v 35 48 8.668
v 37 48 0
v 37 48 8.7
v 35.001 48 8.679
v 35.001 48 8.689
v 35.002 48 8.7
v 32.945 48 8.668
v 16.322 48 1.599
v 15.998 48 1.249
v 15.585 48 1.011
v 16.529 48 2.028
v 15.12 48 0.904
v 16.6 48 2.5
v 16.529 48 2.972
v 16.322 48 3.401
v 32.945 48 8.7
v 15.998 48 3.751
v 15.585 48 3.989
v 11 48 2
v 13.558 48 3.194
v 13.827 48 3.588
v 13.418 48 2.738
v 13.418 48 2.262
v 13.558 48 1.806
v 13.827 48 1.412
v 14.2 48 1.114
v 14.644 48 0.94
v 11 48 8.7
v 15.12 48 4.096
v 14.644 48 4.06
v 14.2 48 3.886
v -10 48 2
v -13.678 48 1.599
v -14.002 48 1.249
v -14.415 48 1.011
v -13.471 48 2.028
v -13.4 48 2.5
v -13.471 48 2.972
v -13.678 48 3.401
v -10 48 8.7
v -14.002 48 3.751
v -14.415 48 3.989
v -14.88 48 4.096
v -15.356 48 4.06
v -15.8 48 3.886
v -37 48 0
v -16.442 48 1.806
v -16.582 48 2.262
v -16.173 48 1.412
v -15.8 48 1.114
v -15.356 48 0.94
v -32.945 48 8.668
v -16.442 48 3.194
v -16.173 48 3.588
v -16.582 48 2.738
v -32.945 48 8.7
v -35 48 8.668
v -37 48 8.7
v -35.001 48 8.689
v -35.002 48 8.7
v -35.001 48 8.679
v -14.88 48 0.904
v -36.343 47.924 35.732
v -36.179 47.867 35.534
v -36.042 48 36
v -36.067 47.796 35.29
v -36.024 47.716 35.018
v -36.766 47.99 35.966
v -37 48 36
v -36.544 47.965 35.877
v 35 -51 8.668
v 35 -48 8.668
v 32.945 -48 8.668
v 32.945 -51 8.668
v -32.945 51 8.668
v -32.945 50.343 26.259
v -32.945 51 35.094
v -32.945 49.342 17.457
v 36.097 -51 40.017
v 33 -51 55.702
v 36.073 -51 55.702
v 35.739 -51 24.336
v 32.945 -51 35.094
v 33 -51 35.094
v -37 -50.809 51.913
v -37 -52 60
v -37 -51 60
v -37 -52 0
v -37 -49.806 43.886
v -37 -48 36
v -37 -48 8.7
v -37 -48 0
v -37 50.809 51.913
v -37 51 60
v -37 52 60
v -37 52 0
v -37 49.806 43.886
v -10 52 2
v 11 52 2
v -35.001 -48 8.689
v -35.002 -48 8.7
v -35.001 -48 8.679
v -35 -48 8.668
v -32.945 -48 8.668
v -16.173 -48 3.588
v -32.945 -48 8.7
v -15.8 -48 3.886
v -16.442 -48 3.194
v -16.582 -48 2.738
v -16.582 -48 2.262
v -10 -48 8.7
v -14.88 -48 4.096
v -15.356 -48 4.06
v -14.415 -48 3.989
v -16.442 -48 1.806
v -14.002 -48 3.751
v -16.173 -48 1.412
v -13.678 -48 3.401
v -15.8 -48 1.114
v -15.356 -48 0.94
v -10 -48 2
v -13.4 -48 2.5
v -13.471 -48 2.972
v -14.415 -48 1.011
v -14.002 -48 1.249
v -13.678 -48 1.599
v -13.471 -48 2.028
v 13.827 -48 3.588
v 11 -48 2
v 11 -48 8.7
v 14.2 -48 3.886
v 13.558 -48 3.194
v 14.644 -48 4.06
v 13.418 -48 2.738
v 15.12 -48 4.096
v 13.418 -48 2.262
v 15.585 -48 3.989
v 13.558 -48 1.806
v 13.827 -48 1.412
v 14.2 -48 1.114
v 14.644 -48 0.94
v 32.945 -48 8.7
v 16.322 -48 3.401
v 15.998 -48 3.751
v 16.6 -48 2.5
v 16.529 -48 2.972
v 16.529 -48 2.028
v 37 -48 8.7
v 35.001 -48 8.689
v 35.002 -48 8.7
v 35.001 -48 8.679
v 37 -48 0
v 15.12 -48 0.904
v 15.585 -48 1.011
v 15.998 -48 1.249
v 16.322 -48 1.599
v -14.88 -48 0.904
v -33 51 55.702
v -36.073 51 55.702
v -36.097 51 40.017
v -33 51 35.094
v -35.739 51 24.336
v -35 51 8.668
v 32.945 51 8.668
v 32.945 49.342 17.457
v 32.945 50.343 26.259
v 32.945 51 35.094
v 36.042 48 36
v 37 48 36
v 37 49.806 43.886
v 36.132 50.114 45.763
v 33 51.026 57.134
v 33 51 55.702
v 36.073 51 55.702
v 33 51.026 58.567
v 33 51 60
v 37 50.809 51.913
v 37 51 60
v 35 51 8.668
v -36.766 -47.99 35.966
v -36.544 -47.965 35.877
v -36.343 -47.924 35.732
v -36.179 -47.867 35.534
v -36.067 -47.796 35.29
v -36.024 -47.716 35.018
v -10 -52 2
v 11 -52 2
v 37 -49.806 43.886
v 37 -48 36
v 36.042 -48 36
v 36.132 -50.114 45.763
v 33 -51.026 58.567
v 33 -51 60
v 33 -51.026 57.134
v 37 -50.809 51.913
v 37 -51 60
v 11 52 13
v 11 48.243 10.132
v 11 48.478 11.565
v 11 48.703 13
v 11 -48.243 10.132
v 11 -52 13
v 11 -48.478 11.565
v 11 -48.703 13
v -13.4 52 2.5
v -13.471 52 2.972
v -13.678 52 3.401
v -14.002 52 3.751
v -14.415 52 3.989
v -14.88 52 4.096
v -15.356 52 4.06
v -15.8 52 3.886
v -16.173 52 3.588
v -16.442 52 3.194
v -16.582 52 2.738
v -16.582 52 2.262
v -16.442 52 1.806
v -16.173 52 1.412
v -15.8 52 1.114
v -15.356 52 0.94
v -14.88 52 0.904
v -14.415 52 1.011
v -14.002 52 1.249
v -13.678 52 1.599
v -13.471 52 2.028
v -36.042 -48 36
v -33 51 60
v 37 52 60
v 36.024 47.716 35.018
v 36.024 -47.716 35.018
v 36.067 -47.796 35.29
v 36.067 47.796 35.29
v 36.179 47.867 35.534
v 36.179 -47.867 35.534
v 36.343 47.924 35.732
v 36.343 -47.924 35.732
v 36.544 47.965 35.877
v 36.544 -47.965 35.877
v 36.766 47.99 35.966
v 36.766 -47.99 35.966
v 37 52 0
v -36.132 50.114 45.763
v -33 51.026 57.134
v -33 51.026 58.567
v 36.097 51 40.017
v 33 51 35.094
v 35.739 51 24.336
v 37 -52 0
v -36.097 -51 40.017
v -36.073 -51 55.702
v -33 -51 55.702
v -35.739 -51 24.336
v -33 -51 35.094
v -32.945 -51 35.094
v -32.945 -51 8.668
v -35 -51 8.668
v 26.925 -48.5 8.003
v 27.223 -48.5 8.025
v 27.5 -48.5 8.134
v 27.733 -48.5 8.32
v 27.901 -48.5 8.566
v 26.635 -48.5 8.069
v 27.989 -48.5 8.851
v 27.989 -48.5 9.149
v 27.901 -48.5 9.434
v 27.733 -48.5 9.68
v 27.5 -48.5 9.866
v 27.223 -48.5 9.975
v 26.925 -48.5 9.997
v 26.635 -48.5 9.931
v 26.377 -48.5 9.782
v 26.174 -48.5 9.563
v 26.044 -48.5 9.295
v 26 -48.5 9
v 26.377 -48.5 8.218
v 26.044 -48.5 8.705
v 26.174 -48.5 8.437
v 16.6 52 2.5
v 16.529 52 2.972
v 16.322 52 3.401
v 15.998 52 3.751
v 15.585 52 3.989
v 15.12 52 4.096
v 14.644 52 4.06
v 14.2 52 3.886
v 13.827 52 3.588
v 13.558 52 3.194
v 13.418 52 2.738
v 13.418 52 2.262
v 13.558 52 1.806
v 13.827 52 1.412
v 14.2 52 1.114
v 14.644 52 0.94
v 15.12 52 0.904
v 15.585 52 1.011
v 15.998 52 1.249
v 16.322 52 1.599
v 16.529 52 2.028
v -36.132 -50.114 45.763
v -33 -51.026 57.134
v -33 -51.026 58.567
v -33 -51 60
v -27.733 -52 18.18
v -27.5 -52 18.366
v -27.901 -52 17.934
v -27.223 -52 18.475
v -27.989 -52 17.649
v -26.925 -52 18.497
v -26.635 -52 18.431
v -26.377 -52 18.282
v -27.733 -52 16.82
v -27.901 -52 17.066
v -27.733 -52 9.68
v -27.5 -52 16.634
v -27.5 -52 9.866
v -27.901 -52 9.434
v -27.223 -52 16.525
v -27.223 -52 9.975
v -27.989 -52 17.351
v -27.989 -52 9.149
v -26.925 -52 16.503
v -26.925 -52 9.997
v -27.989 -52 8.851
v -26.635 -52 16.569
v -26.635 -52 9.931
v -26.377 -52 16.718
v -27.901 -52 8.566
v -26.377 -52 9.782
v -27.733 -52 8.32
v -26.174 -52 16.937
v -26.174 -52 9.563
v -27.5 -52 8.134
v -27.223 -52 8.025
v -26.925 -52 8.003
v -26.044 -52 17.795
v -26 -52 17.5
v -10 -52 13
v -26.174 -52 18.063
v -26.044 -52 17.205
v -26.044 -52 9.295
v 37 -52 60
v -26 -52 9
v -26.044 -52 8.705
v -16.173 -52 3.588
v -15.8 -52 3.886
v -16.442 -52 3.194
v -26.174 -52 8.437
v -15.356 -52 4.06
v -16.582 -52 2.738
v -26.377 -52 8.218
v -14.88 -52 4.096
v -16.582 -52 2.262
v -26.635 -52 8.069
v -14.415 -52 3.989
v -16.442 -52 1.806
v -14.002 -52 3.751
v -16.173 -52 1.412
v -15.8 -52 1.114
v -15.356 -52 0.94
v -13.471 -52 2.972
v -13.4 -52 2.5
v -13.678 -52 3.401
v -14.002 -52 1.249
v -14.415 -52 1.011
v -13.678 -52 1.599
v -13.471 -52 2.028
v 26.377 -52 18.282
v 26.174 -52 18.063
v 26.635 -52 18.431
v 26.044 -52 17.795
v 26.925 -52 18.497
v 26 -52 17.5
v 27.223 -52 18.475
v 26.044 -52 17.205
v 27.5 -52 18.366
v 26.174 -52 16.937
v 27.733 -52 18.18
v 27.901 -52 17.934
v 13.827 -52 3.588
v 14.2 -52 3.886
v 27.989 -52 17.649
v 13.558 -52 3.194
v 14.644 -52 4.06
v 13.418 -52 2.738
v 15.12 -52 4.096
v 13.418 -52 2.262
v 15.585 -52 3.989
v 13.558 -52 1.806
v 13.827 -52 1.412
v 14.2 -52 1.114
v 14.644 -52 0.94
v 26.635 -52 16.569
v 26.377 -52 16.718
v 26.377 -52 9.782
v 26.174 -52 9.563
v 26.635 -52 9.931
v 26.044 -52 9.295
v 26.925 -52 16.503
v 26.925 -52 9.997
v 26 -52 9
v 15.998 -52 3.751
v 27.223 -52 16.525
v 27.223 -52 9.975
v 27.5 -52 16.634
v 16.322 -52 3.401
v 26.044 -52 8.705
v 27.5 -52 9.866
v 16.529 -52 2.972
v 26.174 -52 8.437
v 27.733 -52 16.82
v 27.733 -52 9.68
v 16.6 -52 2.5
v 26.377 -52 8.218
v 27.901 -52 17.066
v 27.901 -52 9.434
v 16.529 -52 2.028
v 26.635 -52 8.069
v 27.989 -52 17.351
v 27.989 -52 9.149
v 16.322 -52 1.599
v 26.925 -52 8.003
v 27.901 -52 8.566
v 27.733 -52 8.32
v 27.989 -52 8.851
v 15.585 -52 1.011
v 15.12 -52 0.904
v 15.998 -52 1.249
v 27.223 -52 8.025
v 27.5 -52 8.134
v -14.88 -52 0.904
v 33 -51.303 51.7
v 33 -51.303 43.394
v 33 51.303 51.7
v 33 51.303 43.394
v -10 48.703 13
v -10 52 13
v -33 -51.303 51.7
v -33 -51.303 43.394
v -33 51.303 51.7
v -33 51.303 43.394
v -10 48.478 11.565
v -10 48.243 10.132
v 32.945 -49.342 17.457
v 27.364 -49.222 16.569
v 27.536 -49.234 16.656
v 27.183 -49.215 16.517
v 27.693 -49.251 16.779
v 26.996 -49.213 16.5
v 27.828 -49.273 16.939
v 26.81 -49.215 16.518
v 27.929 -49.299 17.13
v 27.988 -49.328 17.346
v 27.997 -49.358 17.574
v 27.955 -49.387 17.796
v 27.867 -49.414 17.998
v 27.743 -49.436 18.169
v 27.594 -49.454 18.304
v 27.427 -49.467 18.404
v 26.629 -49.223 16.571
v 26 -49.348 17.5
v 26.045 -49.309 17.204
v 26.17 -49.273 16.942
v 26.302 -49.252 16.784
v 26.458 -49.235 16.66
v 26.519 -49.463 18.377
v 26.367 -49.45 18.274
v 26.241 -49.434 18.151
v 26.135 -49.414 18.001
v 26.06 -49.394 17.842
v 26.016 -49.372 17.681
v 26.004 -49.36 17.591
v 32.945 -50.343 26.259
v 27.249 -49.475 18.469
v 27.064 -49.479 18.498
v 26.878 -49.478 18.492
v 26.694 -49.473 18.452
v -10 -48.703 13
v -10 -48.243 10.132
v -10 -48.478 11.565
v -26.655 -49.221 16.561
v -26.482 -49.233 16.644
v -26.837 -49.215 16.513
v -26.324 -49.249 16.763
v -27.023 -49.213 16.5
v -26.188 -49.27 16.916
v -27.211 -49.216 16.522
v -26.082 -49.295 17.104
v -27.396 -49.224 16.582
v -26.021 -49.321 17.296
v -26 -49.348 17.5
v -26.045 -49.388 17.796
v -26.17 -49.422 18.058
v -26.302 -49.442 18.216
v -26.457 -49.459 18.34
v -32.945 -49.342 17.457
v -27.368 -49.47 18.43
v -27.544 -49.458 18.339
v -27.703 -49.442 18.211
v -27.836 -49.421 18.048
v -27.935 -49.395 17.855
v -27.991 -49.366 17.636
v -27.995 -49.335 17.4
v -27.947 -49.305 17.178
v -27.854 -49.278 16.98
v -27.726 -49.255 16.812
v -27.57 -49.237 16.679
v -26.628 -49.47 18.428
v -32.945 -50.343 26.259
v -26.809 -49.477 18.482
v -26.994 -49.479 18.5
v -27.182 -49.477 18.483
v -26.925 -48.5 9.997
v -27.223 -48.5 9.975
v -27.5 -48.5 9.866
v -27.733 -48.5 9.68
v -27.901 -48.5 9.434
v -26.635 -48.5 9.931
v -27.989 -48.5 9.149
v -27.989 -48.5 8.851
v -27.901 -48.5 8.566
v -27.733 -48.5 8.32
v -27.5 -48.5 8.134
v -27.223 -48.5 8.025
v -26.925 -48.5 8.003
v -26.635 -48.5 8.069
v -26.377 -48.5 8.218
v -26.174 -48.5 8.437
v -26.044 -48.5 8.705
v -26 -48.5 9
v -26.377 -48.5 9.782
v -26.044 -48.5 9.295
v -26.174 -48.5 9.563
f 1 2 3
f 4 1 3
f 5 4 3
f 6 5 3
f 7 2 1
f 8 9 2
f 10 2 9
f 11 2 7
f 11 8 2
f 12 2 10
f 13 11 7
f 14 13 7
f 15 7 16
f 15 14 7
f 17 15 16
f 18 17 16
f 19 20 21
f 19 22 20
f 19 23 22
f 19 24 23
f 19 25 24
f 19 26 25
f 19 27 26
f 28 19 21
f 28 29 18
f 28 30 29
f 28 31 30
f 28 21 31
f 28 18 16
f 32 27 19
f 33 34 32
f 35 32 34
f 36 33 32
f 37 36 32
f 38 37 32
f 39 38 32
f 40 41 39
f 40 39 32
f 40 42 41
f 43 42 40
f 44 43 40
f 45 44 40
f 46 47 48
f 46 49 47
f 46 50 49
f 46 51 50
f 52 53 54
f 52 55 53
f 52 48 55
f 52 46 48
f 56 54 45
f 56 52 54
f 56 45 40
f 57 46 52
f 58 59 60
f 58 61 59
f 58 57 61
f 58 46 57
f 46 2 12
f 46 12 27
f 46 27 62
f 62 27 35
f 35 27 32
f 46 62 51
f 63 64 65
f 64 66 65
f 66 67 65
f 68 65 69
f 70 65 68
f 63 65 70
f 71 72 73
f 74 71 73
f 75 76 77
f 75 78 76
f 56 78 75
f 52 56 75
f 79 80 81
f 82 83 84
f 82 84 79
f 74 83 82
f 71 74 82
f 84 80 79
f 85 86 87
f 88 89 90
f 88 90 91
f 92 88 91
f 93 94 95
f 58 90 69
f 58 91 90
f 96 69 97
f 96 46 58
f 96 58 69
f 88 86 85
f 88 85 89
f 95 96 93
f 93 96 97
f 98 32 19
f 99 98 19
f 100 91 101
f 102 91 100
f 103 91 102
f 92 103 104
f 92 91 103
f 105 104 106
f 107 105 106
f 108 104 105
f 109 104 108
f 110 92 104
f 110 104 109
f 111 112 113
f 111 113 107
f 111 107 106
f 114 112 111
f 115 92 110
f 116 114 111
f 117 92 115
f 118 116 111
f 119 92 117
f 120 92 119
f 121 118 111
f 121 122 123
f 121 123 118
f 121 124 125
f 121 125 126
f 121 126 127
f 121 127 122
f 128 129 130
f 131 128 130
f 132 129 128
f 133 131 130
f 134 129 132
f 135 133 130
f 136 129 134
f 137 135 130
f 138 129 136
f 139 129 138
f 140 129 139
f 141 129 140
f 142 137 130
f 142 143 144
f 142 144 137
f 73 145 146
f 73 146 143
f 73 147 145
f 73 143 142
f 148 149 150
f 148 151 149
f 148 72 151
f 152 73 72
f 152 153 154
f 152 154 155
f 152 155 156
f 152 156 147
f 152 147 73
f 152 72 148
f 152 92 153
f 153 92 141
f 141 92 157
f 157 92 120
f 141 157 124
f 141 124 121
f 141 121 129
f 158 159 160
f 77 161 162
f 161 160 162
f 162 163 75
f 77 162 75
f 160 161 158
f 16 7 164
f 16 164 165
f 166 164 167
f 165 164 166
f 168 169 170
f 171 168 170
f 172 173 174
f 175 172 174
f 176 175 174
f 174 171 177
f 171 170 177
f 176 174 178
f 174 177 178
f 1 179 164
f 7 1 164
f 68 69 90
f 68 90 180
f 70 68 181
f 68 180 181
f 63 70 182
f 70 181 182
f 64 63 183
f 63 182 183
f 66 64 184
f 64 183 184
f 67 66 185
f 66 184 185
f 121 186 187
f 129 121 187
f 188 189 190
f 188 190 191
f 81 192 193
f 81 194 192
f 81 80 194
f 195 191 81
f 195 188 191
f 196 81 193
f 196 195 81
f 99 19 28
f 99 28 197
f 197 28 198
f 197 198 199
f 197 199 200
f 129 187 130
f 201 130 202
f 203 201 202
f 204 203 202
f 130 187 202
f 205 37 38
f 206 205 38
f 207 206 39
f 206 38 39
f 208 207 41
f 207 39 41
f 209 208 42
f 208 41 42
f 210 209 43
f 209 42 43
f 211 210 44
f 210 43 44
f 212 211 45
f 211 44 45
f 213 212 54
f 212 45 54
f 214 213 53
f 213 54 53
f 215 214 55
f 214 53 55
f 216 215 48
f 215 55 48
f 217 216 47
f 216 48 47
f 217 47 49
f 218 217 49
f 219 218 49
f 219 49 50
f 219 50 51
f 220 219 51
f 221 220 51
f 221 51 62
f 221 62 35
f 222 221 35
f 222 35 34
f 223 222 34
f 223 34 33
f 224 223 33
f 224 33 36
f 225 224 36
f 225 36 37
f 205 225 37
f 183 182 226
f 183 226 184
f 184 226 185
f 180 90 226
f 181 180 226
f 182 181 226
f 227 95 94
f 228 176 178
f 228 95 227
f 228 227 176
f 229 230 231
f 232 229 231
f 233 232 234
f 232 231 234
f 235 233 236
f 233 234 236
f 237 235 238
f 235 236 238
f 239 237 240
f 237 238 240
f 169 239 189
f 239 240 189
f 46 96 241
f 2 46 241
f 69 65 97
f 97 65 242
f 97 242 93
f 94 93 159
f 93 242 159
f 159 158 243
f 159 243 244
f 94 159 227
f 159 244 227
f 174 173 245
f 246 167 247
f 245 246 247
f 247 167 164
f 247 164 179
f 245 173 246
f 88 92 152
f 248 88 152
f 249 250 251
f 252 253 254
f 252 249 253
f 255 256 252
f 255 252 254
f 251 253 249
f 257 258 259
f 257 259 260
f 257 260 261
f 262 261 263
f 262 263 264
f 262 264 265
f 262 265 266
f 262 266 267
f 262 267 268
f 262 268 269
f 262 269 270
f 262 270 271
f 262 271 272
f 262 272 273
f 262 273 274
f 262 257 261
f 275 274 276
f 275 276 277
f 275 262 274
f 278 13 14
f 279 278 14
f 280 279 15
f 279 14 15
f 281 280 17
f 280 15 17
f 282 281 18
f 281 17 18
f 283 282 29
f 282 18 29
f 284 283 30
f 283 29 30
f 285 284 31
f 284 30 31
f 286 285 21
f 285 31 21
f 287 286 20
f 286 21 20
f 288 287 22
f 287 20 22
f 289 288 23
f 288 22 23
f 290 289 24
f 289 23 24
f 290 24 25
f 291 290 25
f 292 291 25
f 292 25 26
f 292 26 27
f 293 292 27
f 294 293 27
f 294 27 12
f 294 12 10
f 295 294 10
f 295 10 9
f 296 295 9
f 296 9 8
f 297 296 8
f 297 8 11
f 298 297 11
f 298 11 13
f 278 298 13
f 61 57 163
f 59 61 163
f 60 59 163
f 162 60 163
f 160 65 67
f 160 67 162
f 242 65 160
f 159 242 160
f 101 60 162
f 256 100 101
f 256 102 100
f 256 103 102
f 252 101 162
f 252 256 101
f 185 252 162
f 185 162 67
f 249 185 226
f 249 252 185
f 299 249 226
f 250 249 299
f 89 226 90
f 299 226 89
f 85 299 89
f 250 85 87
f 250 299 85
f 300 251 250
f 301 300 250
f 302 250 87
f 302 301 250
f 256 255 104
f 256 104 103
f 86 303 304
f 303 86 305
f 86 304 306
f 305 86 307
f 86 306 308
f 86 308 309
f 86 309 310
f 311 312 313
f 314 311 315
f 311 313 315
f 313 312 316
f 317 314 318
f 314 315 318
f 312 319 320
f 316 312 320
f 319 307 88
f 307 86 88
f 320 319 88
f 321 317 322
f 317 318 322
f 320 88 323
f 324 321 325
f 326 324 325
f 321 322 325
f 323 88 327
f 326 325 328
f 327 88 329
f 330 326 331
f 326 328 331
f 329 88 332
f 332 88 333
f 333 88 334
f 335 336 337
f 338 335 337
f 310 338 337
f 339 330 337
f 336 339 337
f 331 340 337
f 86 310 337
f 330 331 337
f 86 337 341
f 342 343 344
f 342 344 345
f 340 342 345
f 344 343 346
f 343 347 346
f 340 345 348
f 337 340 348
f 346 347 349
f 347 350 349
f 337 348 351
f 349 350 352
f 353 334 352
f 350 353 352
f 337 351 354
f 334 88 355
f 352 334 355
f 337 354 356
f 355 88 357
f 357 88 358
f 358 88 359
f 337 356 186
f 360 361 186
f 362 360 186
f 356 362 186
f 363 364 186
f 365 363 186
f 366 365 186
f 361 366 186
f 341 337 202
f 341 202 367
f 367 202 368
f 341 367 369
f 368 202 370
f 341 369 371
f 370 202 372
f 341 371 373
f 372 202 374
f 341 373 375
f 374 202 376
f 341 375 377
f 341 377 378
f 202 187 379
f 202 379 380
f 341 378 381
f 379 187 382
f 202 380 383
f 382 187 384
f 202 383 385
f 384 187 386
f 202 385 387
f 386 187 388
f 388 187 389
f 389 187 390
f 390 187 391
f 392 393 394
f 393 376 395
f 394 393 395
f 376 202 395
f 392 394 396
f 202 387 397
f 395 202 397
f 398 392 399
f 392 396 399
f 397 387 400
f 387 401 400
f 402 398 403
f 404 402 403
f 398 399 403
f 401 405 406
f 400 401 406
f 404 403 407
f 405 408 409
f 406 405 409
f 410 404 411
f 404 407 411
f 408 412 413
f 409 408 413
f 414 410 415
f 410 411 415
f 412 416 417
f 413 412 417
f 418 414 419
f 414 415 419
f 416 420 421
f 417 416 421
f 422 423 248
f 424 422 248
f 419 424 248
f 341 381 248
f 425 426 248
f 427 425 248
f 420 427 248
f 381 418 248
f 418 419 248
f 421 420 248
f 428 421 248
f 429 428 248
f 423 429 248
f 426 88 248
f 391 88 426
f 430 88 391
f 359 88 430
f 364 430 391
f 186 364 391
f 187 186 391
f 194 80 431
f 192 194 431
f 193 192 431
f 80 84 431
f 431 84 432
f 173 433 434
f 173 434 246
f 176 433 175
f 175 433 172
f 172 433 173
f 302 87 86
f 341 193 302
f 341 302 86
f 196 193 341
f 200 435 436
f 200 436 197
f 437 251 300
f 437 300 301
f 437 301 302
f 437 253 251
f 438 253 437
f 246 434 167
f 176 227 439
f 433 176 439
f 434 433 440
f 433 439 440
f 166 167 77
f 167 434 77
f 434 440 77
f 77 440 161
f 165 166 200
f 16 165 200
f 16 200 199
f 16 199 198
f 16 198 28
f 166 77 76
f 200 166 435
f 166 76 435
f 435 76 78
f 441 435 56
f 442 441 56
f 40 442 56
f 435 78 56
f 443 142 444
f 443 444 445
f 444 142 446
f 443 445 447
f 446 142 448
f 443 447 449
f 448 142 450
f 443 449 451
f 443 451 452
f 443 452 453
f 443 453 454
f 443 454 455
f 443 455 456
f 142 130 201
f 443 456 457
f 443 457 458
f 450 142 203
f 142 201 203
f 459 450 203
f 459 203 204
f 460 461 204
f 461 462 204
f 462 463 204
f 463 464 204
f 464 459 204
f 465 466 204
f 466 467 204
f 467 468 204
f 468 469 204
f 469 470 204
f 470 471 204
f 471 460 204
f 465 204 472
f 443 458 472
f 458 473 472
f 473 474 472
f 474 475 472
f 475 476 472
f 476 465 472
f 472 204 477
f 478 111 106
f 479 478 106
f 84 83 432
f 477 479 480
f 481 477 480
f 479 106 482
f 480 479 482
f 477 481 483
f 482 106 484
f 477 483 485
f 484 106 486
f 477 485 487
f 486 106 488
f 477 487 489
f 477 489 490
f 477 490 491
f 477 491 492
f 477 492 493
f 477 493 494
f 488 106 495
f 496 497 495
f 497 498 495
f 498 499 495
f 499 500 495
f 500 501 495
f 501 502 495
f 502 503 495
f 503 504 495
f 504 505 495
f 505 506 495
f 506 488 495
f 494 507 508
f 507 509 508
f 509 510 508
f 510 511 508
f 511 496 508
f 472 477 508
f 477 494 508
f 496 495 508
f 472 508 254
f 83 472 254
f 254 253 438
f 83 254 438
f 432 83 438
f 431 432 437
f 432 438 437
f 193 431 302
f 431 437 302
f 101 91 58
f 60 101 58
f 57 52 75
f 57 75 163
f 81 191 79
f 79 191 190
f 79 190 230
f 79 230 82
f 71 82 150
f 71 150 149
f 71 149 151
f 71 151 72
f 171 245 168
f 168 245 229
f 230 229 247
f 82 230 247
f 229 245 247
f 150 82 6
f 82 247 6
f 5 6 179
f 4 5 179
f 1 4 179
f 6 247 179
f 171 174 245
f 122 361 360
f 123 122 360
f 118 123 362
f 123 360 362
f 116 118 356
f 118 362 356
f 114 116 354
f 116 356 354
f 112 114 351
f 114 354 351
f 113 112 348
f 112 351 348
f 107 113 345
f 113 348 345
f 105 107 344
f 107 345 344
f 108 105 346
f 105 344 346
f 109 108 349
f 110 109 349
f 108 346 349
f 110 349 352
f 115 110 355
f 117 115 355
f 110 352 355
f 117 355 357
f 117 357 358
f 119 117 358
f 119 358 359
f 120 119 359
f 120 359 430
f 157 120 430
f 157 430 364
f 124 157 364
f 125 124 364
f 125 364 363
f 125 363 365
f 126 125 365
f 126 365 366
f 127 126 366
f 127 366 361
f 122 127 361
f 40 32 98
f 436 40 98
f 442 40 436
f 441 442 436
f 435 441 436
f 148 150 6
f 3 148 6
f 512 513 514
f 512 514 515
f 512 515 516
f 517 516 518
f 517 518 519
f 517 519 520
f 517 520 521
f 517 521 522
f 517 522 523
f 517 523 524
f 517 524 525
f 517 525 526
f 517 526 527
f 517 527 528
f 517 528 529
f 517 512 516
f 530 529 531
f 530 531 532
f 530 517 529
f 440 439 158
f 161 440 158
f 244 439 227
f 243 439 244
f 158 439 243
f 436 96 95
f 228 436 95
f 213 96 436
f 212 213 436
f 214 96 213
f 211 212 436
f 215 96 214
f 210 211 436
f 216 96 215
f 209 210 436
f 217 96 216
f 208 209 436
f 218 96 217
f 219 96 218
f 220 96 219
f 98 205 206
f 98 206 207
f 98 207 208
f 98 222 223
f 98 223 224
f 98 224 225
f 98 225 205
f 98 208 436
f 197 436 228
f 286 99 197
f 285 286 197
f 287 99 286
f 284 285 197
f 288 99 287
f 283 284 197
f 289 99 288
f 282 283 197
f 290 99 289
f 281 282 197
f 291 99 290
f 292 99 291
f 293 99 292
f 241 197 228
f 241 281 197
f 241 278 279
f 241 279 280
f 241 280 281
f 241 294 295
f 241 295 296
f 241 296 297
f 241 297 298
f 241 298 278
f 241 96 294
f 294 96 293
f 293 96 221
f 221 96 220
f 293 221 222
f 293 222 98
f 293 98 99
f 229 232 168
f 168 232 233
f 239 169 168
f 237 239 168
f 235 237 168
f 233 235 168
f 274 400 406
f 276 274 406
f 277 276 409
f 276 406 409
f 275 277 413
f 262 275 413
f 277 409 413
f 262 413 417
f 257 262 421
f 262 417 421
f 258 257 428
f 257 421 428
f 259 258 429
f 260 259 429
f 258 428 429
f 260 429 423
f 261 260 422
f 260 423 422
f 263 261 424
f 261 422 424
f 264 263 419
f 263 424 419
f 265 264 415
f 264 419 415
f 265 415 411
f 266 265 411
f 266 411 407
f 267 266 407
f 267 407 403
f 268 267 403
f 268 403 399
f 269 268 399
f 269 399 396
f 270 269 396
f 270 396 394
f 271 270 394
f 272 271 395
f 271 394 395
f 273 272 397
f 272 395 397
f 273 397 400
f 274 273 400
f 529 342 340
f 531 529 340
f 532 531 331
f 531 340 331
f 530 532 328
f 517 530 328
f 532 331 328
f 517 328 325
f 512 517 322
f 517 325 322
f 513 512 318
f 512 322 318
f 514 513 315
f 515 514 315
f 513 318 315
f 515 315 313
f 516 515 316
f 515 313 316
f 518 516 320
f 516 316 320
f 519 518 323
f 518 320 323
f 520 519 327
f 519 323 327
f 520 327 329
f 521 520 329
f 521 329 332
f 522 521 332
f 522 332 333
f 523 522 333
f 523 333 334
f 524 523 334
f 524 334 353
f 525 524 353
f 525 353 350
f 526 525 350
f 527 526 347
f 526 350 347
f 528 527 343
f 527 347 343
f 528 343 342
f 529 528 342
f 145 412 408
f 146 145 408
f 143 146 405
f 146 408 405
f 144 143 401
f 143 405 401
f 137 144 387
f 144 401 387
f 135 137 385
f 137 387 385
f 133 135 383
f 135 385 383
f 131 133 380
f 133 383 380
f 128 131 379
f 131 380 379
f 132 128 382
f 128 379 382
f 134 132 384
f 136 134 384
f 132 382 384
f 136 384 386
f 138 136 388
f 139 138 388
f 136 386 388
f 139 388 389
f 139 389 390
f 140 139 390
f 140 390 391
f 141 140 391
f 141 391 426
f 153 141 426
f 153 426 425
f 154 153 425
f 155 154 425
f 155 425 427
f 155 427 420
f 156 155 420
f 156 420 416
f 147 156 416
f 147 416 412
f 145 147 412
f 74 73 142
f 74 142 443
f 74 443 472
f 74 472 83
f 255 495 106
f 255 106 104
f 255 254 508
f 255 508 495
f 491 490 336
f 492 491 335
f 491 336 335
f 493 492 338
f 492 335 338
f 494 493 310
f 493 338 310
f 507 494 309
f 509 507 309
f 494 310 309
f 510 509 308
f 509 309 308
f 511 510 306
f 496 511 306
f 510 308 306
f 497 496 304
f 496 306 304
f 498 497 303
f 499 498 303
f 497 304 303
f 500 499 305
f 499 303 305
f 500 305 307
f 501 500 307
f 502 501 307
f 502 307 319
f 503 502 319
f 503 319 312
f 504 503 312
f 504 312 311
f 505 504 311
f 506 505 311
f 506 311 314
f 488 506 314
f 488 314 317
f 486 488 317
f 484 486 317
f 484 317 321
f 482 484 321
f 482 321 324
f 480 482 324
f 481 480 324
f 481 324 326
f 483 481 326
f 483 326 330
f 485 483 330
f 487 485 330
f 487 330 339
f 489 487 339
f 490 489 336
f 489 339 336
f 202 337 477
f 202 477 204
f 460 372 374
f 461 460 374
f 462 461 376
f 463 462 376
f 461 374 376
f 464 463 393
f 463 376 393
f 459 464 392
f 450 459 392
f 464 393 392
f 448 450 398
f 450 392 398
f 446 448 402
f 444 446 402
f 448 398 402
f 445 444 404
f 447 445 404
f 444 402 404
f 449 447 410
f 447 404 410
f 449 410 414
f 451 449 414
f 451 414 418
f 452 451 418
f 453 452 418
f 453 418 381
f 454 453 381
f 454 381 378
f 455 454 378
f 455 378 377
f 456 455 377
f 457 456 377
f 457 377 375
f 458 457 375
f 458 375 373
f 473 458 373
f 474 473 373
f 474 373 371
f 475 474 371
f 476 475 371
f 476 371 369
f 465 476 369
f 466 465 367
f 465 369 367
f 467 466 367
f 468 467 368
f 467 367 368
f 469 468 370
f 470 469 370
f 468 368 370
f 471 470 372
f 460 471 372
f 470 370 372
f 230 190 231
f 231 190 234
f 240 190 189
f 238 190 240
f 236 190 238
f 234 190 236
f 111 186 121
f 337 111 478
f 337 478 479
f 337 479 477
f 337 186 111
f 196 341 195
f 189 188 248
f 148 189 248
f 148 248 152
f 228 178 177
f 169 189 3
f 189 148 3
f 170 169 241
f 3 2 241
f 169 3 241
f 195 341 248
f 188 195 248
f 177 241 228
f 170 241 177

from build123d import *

# Parameters (mm, degrees)
SKETCH1_W           = 74
SKETCH1_H           = 104
BOSS_EXTRUDE1_DEPTH = 40
SKETCH2_W           = 66
SKETCH2_H           = 96
CUT_EXTRUDE1_DEPTH  = 40
SKETCH3_R           = 1.6
CUT_EXTRUDE2_DEPTH  = 118.409539646
SKETCH4_W           = 8.7
SKETCH4_H           = 96
CUT_EXTRUDE3_DEPTH  = 99.893882521
SKETCH5_R           = 1
CUT_EXTRUDE4_DEPTH  = 3.5
SKETCH9_W           = 74
SKETCH9_H           = 4
BOSS_EXTRUDE2_DEPTH = 20
CUT_EXTRUDE7_DEPTH  = 66
SKETCH8_W           = 21
SKETCH8_H           = 11
CUT_EXTRUDE10_DEPTH = 126.638369983
SKETCH16_W          = 74
SKETCH16_H          = 96
CUT_EXTRUDE11_DEPTH = 6
CUT_EXTRUDE13_DEPTH = 109.535708513
CUT_EXTRUDE14_DEPTH = 51
FILLET3_R           = 1


with BuildPart() as part:
    # Sketch1 → Boss-Extrude1 (new body)
    with BuildSketch(Plane.XY):
        Rectangle(SKETCH1_W, SKETCH1_H)
    extrude(amount=BOSS_EXTRUDE1_DEPTH)

    # Sketch2 → Cut-Extrude1 (cut)
    with BuildSketch(Plane.XY.offset(40)):
        Rectangle(SKETCH2_W, SKETCH2_H)
    extrude(amount=-CUT_EXTRUDE1_DEPTH, mode=Mode.SUBTRACT)

    # Sketch3 → Cut-Extrude2 (cut, through all)
    with BuildSketch(Plane.XZ.offset(52)):
        with Locations((-15, 2.5)):
            Circle(SKETCH3_R)
        with Locations((15, 2.5)):
            Circle(SKETCH3_R)
    extrude(amount=-CUT_EXTRUDE2_DEPTH, mode=Mode.SUBTRACT)

    # Sketch4 → Cut-Extrude3 (cut, through all)
    with BuildSketch(Plane.ZY.offset(37)):
        with Locations((4.35, 0)):
            Rectangle(SKETCH4_W, SKETCH4_H)
    extrude(amount=-CUT_EXTRUDE3_DEPTH, mode=Mode.SUBTRACT)

    # Sketch5 → Cut-Extrude4 (cut)
    with BuildSketch(Plane.XZ.offset(52)):
        with Locations((-27, 9)):
            Circle(SKETCH5_R)
        with Locations((-27, 17.5)):
            Circle(SKETCH5_R)
        with Locations(Location((27, 9, 0), (0, 0, 180))):
            Circle(SKETCH5_R)
        with Locations(Location((27, 17.5, 0), (0, 0, 180))):
            Circle(SKETCH5_R)
    extrude(amount=-CUT_EXTRUDE4_DEPTH, mode=Mode.SUBTRACT)

    # Sketch9 → Boss-Extrude2 (add)
    with BuildSketch(Plane.XY.offset(40)):
        with Locations((0, -50)):
            Rectangle(SKETCH9_W, SKETCH9_H)
        with Locations((0, 50)):
            Rectangle(SKETCH9_W, SKETCH9_H)
    extrude(amount=BOSS_EXTRUDE2_DEPTH)

    # Sketch11 → Cut-Extrude7 (cut)
    with BuildSketch(Plane(origin=(-33, 0, 0), x_dir=(0, 0, -1), z_dir=(1, 0, 0))):
        with BuildLine():
            Line((-60, -48), (-8.7, -48))
            ThreePointArc((-8.7, -48), (-34.265026612, -50.953044928), (-60, -51))
            Line((-60, -51), (-60, -48))
        make_face()
        with BuildLine():
            Line((-60, 48), (-60, 51))
            ThreePointArc((-60, 51), (-34.265026612, 50.953044928), (-8.7, 48))
            Line((-8.7, 48), (-60, 48))
        make_face()
    extrude(amount=CUT_EXTRUDE7_DEPTH, mode=Mode.SUBTRACT)

    # Sketch8 → Cut-Extrude10 (cut, through all)
    with BuildSketch(Plane.XZ.offset(52)):
        with Locations((0.5, 7.5)):
            Rectangle(SKETCH8_W, SKETCH8_H)
    extrude(amount=-CUT_EXTRUDE10_DEPTH, mode=Mode.SUBTRACT)

    # Sketch16 → Cut-Extrude11 (cut)
    with BuildSketch(Plane.XY.offset(42)):
        Rectangle(SKETCH16_W, SKETCH16_H)
    extrude(amount=-CUT_EXTRUDE11_DEPTH, mode=Mode.SUBTRACT)

    # Sketch18 → Cut-Extrude13 (cut, through all)
    with BuildSketch(Plane(origin=(37, 0, 0), x_dir=(0, 0, -1), z_dir=(1, 0, 0))):
        with BuildLine():
            Line((-60, 51), (-60, 48))
            Line((-60, 48), (-36, 48))
            ThreePointArc((-36, 48), (-47.886451631, 50.40838695), (-60, 51))
        make_face()
        with BuildLine():
            Line((-60, -48), (-36, -48))
            ThreePointArc((-36, -48), (-47.886451631, -50.40838695), (-60, -51))
            Line((-60, -51), (-60, -48))
        make_face()
    extrude(amount=-CUT_EXTRUDE13_DEPTH, mode=Mode.SUBTRACT)

    # Sketch20 → Cut-Extrude14 (cut, symmetric)
    with BuildSketch(Plane(origin=(0, 0, 0), x_dir=(1, 0, 0), z_dir=(0, 1, 0))):
        with BuildLine():
            Line((-36, -60), (-33, -60))
            Line((-33, -60), (-32.94530899, -59.042459963))
            Line((-32.94530899, -59.042459963), (-32.94530899, -8.667965125))
            Line((-32.94530899, -8.667965125), (-35, -8.667965125))
            ThreePointArc((-35, -8.667965125), (-36.011139943, -34.324025039), (-36, -60))
        make_face()
        with BuildLine():
            Line((32.94530899, -8.667965125), (32.94530899, -59.042459963))
            Line((32.94530899, -59.042459963), (33, -60))
            Line((33, -60), (36, -60))
            ThreePointArc((36, -60), (36.011139943, -34.324025039), (35, -8.667965125))
            Line((35, -8.667965125), (32.94530899, -8.667965125))
        make_face()
    extrude(amount=CUT_EXTRUDE14_DEPTH, both=True, mode=Mode.SUBTRACT)

    # Fillet3
    # the kernel refuses this fillet: 1 mm, written as the material it takes off along each edge
    with BuildSketch(Plane(origin=(36.041610271, -50.456283498, 36), x_dir=(1, 0, 0), z_dir=(0, 1, 0))) as fillet3_piece_1_section:
        with BuildLine():
            CenterArc((0.982513399, 1), FILLET3_R, 181.05432328, 88.94567672)
            ThreePointArc((-0.017317299, 0.981599626), (-0.008471821, 0.490803109), (0, 0))
            Line((0, 0), (0.982513399, 0))
        make_face()
    fillet3_piece_1 = extrude(amount=100.912566997, mode=Mode.PRIVATE)
    fillet3_piece_1 = fillet3_piece_1 & Plane(origin=(36.2601728, -29.307183003, 57.850897875), x_dir=(0, 0.9622989266780244, -0.27199407293969147), z_dir=(1, 0, 0)) * Cylinder(80.335933938, 206, mode=Mode.PRIVATE)
    fillet3_piece_1 = fillet3_piece_1 & Plane(origin=(36.2601728, 29.307183003, 57.850897875), x_dir=(0, -0.9622989266780254, -0.27199407293968814), z_dir=(1, 0, 0)) * Cylinder(80.335933938, 206, mode=Mode.PRIVATE)
    add(fillet3_piece_1, mode=Mode.SUBTRACT)
    with BuildSketch(Plane(origin=(-36.041610271, -50.456283498, 36), x_dir=(-1, 0, 0), z_dir=(0, 1, 0))) as fillet3_piece_2_section:
        with BuildLine():
            CenterArc((0.982513399, -1), FILLET3_R, 90, 88.94567672)
            ThreePointArc((-0.017317299, -0.981599626), (-0.008471821, -0.490803109), (0, 0))
            Line((0, 0), (0.982513399, 0))
        make_face()
    fillet3_piece_2 = extrude(amount=100.912566997, mode=Mode.PRIVATE)
    fillet3_piece_2 = fillet3_piece_2 & Plane(origin=(-36.2601728, -29.307183003, 57.850897875), x_dir=(0, 0.9622989266780244, -0.27199407293969147), z_dir=(1, 0, 0)) * Cylinder(80.335933938, 206, mode=Mode.PRIVATE)
    fillet3_piece_2 = fillet3_piece_2 & Plane(origin=(-36.2601728, 29.307183003, 57.850897875), x_dir=(0, -0.9622989266780254, -0.27199407293968814), z_dir=(1, 0, 0)) * Cylinder(80.335933938, 206, mode=Mode.PRIVATE)
    add(fillet3_piece_2, mode=Mode.SUBTRACT)


solid = part.part
